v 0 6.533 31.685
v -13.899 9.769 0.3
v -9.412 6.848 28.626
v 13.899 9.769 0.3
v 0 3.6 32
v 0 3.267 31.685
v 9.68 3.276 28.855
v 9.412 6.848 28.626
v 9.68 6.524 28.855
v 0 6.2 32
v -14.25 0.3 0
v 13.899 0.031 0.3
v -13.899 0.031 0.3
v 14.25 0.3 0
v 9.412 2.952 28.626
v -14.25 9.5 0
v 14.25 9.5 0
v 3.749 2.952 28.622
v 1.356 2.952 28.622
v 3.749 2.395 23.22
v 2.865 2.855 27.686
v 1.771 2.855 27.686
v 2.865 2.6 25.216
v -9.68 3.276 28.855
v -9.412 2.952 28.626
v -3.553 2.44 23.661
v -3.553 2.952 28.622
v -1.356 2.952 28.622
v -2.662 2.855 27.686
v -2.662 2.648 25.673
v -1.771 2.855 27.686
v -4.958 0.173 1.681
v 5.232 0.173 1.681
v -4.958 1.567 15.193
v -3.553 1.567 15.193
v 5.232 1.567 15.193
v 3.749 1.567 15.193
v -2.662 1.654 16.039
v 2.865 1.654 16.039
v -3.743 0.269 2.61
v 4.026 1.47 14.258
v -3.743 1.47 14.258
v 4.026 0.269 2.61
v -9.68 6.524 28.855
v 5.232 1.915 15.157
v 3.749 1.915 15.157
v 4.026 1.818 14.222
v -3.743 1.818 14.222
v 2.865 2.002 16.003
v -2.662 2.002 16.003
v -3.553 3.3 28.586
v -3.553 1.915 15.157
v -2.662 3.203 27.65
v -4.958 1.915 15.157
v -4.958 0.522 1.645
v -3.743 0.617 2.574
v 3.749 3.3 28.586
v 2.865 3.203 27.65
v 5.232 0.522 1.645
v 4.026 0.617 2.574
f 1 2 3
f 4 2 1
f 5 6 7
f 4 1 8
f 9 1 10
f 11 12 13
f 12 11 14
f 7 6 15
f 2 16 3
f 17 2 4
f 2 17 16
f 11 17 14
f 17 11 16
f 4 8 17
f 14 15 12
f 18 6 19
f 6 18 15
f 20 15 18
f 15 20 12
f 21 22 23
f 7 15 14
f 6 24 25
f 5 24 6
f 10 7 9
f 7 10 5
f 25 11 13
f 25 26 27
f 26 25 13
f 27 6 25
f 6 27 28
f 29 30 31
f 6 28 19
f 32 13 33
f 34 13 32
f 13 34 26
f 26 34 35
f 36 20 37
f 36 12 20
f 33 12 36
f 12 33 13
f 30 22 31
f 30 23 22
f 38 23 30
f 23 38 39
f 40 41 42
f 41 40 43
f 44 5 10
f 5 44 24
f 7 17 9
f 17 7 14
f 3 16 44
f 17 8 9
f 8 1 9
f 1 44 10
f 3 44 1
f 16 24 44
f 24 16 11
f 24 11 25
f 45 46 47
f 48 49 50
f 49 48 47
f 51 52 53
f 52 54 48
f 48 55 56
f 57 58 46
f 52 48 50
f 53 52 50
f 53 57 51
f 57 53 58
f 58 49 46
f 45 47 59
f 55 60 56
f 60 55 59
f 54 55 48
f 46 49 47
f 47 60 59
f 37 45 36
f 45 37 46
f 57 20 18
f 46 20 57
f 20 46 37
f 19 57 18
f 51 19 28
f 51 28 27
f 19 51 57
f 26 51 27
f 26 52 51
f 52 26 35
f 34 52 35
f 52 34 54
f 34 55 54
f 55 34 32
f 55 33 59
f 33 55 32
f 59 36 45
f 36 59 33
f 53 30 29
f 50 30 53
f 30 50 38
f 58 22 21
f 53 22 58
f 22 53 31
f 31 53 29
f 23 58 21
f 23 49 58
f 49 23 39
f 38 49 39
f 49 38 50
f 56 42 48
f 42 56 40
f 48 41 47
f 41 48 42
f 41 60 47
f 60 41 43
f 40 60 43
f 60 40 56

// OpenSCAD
// file: ../lib/filaments.scad
// SPDX-License-Identifier: MIT
// Copyright (c) 2026 KomaSCAD contributors. https://github.com/Kazutadashi/koma-scad
//
// The named filaments of every module. Include this file:
//     include <../lib/filaments.scad>
// A Customizer list of filaments must name these entries, and can add Custom.

// [name, [red, green, blue, opacity]], each channel from 0 to 1.
filament_palette = [
    ["Wood", [0.76, 0.58, 0.34, 1]],   ["Black", [0.08, 0.06, 0.04, 1]],
    ["White", [0.95, 0.95, 0.95, 1]],  ["Red", [0.65, 0.05, 0.04, 1]],
    ["Blue", [0.08, 0.25, 0.8, 1]],    ["Green", [0.08, 0.5, 0.2, 1]],
    ["Purple", [0.45, 0.15, 0.65, 1]], ["Yellow", [0.95, 0.8, 0.08, 1]],
    ["Orange", [0.95, 0.35, 0.05, 1]], ["Silver", [0.7, 0.72, 0.75, 1]],
    ["Gold", [0.8, 0.62, 0.2, 1]],     ["Glitter silver", [0.7, 0.72, 0.75, 1]],
    ["Glitter gold", [0.8, 0.62, 0.2, 1]],
    ["Filament 1", [0.5, 0.5, 0.5, 1]], ["Filament 2", [0.15, 0.5, 0.85, 1]], ["Filament 3", [0.85, 0.25, 0.5, 1]],
    // The colors of the traditional woods: kaya (榧) for boards and komadai, island
    // mulberry (桑) and black persimmon (黒柿) for boxes. Colors only: no grain.
    ["Kaya", [0.86, 0.72, 0.47, 1]],   ["Kuwa", [0.66, 0.45, 0.23, 1]],
    ["Kurogaki", [0.23, 0.18, 0.14, 1]]
];

// The color of a named filament. Custom gives custom_rgba.
function filament_rgba(name, custom_rgba) =
    let(found = [for (entry = filament_palette) if (entry[0] == name) entry[1]])
    name == "Custom" ? custom_rgba
    : assert(len(found) == 1, str("Unknown filament: ", name)) found[0];
// main file
// SPDX-License-Identifier: MIT
// Copyright (c) 2026 KomaSCAD contributors. https://github.com/Kazutadashi/koma-scad
//
// KomaSCAD: a parametric shogi piece. Tested with OpenSCAD 2021.01.
// The default settings make the king of the bundled shogi set.
// Units are mm and degrees, before Model Scale, unless a comment says otherwise.
// Guides: README.md. Every setting: docs/parameters.md.
// Keep koma.json and move_diagrams.scad next to this file, and ../lib/ next to its folder.

/* [01 - Start here] */
// A label for your own use. It does not change the piece.
Category = "King";
// Characters on the front, from the point to the heel.
Front_Characters = "王将";
// Characters on the back (the promoted side). Empty = blank back.
Back_Characters = "";
// An installed Japanese font. Find its exact name in Help > Font List.
Font_Name = "Yuji Syuku:style=Regular";
// Model shows the piece in its colors; press F6 for an STL. Use komascad.py export for a color 3MF.
Output_Mode = "Model"; // [Model,Blank,Inspect front,Inspect back,Inspect printability,Inspect signature,Inspect pawn circle]
// How the piece sits on the print bed. Raised text cannot touch the bed.
Print_Orientation = "Upright"; // [Upright,Front face down,Back face down]
// Multiplier for all lengths. 1 = the dimensions below.
Model_Scale = 1; // [0.25:0.05:20]

/* [02 - Piece dimensions] */
// mm. Length from the heel to the point.
Piece_Length = 32; // [15:0.1:100]
// mm. Width at the heel.
Base_Width = 28.5; // [10:0.1:100]
// mm. Thickness at the heel.
Rear_Thickness = 9.8; // [3:0.1:30]
// Tip thickness: set the thickness at the point. Reference side angles: set the slope of each face.
Taper_Mode = "Tip thickness"; // [Tip thickness,Reference side angles]
// mm. Thickness at the point, before the bevel.
Tip_Thickness = 3.2; // [1:0.1:20]

/* [03 - Front layout] */
// mm. Text size, not the measured glyph height. 0 = automatic.
Front_Font_Size = 10.4; // [0:0.1:40]
// Multiplier for the text size. 1.1 = 10% larger.
Front_Text_Scale = 1; // [0.25:0.01:2]
// mm. Distance between character centers. 0 = automatic.
Front_Character_Spacing = 10.5; // [0:0.1:40]
// Multiplier for the automatic spacing. It does not change the text size.
Front_Spacing_Scale = 1; // [0.5:0.01:2]
// Center of the text: 0 = heel, 1 = point. With Move Pitch above 0, the center of the characters only.
Front_Center_Fraction = 0.455; // [0:0.01:1]
// mm. Moves all the text. Positive = to the right.
Front_Text_X = 0; // [-20:0.1:20]
// mm. Moves all the text. Positive = toward the point.
Front_Text_Y = 0; // [-20:0.1:20]
// Multiplier for the glyph width. It does not change the spacing.
Front_Width_Scale = 1; // [0.25:0.01:2]
// Multiplier for the glyph height.
Front_Height_Scale = 1.06; // [0.25:0.01:2]
// Degrees, counterclockwise. Turns all the text around its center.
Front_Text_Rotation = 0; // [-180:1:180]

/* [04 - Back layout] */
// Use the front layout, text style, depth and stroke on the back. Back text and color stay separate.
Mirror_Front_Settings = false;
// mm. Text size, not the measured glyph height. 0 = automatic.
Back_Font_Size = 0; // [0:0.1:40]
// Multiplier for the text size. 1.1 = 10% larger.
Back_Text_Scale = 1; // [0.25:0.01:2]
// mm. Distance between character centers. 0 = automatic.
Back_Character_Spacing = 0; // [0:0.1:40]
// Multiplier for the automatic spacing. It does not change the text size.
Back_Spacing_Scale = 1; // [0.5:0.01:2]
// Center of the text: 0 = heel, 1 = point. With Move Pitch above 0, the center of the characters only.
Back_Center_Fraction = 0.42; // [0:0.01:1]
// mm. Moves all the text. Positive = to the right, seen from the back.
Back_Text_X = 0; // [-20:0.1:20]
// mm. Moves all the text. Positive = toward the point.
Back_Text_Y = 0; // [-20:0.1:20]
// Multiplier for the glyph width. It does not change the spacing.
Back_Width_Scale = 1; // [0.25:0.01:2]
// Multiplier for the glyph height.
Back_Height_Scale = 1; // [0.25:0.01:2]
// Degrees, counterclockwise. Turns all the text around its center.
Back_Text_Rotation = 0; // [-180:1:180]

/* [05 - Front character adjustments] */
// Multiplier for each character: [first, second, third], from the point. A diagram uses the entry of its slot.
Front_Glyph_Size = [1, 1, 1]; // [0.25:0.01:2]
// Multiplier for the width of each character.
Front_Glyph_Width = [1, 1.4, 1]; // [0.25:0.01:2]
// Multiplier for the height of each character.
Front_Glyph_Height = [1, 1, 1]; // [0.25:0.01:2]
// mm. Moves each character. Positive = to the right.
Front_Glyph_X = [0, 0, 0]; // [-10:0.1:10]
// mm. Moves each character. Positive = toward the point.
Front_Glyph_Y = [2, -1, 0]; // [-10:0.1:10]
// Degrees, counterclockwise. Turns each character.
Front_Glyph_Rotation = [0, 0, 0]; // [-180:1:180]

/* [06 - Back character adjustments] */
// Multiplier for each character: [first, second, third], from the point. A diagram uses the entry of its slot.
Back_Glyph_Size = [1, 1, 1]; // [0.25:0.01:2]
// Multiplier for the width of each character.
Back_Glyph_Width = [1, 1, 1]; // [0.25:0.01:2]
// Multiplier for the height of each character.
Back_Glyph_Height = [1, 1, 1]; // [0.25:0.01:2]
// mm. Moves each character. Positive = to the right, seen from the back.
Back_Glyph_X = [0, 0, 0]; // [-10:0.1:10]
// mm. Moves each character. Positive = toward the point.
Back_Glyph_Y = [1, 0, 0]; // [-10:0.1:10]
// Degrees, counterclockwise. Turns each character.
Back_Glyph_Rotation = [0, 0, 0]; // [-180:1:180]

/* [07 - Filament colors] */
// Body color. It becomes a named material in the color 3MF. Custom uses Body Color.
Body_Filament = "Wood"; // [Wood,Black,White,Red,Blue,Green,Purple,Yellow,Orange,Silver,Gold,Glitter silver,Glitter gold,Filament 1,Filament 2,Filament 3,Custom]
// Front text color.
Front_Filament = "Black"; // [Same as body,Wood,Black,White,Red,Blue,Green,Purple,Yellow,Orange,Silver,Gold,Glitter silver,Glitter gold,Filament 1,Filament 2,Filament 3,Custom]
// Back text color.
Back_Filament = "Red"; // [Same as body,Same as front,Wood,Black,White,Red,Blue,Green,Purple,Yellow,Orange,Silver,Gold,Glitter silver,Glitter gold,Filament 1,Filament 2,Filament 3,Custom]

/* [08 - Engraving and stroke weight] */
// Face only: color the groove floor. Painted grooves: floor and walls. Flush filled: fill the groove.
Text_Color_Treatment = "Flush filled"; // [Face only,Painted grooves,Flush filled]
// Recessed: cut into the face. Raised: stands up from the face. None: no text.
Front_Text_Style = "Recessed"; // [Recessed,Raised,None]
// Recessed: cut into the face. Raised: stands up from the face. None: no text.
Back_Text_Style = "Recessed"; // [Recessed,Raised,None]
// mm. Depth of recessed text, or height of raised text.
Front_Relief_Depth = 0.35; // [0:0.05:3]
// mm. Depth of recessed text, or height of raised text.
Back_Relief_Depth = 0.35; // [0:0.05:3]
// mm. Makes each stroke wider (positive) or thinner (negative). Wide strokes can close small gaps.
Front_Stroke_Expansion = 0.04; // [-0.2:0.01:0.5]
// mm. Makes each stroke wider (positive) or thinner (negative). Wide strokes can close small gaps.
Back_Stroke_Expansion = 0.04; // [-0.2:0.01:0.5]
// A different font for the front. Empty = Font Name.
Front_Font_Override = "";
// A different font for the back. Empty = Font Name.
Back_Font_Override = "";
// mm. Rounds the text edges. 0 = sharp. Rounding can remove thin strokes.
Text_Edge_Radius = 0; // [0:0.01:0.5]
// Number of layers that make a rounded text edge.
Text_Rounding_Steps = 6; // [2:1:12]

/* [09 - Edges and face margin] */
// mm. Width of the edge bevel, seen from above. 0 = no bevel.
Bevel_Width = 0.3; // [0:0.05:3]
// mm. Depth of the edge bevel. 0 = no bevel.
Bevel_Depth = 0.3; // [0:0.02:2]
// mm. Smallest distance from the text to the edge of the flat face.
Text_Margin = 0.9; // [0:0.1:4]
// Cut off text that goes past the margin. Inspect front and Inspect back show it in red.
Protect_Face_Edges = true;
// mm, after Model Scale. Smallest solid thickness at the point, between the front and back recesses.
Minimum_Web = 1.2; // [0.2:0.1:5]

/* [10 - Advanced shape angles] */
// Make the outline fit 20 pieces into a ring (base angle 81 degrees). Check it with Inspect pawn circle.
Pawn_Circle = true;
// The angle to calculate from the other two: 2 x base + 2 x shoulder + tip = 540 degrees.
Angle_Mode = "Derive shoulder"; // [Derive shoulder,Derive tip,Derive base,Check all three]
// Degrees. Outline angle at the two heel corners.
Face_Base_Angle = 81;
// Degrees. Outline angle at the two shoulders.
Face_Shoulder_Angle = 117;
// Degrees. Outline angle at the point.
Face_Tip_Angle = 144;
// Degrees. Slope of the front face at the heel. Only for Reference side angles.
Front_Side_Base_Angle = 85;
// Degrees. Slope of the back face at the heel. Only for Reference side angles.
Back_Side_Base_Angle = 81;

/* [11 - Inspection and quality] */
// [red, green, blue, opacity], 0 to 1. Used when Body Filament is Custom.
Body_Color = [0.82, 0.68, 0.43, 1];
// [red, green, blue, opacity], 0 to 1. Used when Front Filament is Custom.
Front_Inscription_Color = [0.025, 0.02, 0.015, 1];
// [red, green, blue, opacity], 0 to 1. Used when Back Filament is Custom.
Back_Inscription_Color = [0.65, 0.05, 0.04, 1];
// Show the safe area and the center line in the Inspect views.
Show_Layout_Guides = true;
// Number of segments in a curve. More is smoother and slower.
Text_Curve_Resolution = 64; // [16:8:128]
// mm, after Model Scale. The line width of your printer on the face. Inspect printability and komascad.py check use it.
Print_Line_Width = 0.5; // [0.2:0.05:1.2]

/* [12 - Maker signature on heel] */
// Put a mark on the heel (the wide bottom edge).
Signature_Enabled = false;
// The mark. It reads left to right when you look at the heel with the front face up.
Signature_Text = "";
// Font of the mark. Empty = Font Name.
Signature_Font = "";
// mm. Text size of the mark.
Signature_Font_Size = 5; // [0.5:0.1:8]
// Multiplier for the letter spacing.
Signature_Letter_Spacing = 1; // [0.5:0.05:2]
// mm. Moves the mark. Positive = to the right.
Signature_X = 0; // [-12:0.1:12]
// mm. Moves the mark. Positive = toward the front face.
Signature_Y = 0; // [-5:0.1:5]
// Degrees, counterclockwise. Turns the mark.
Signature_Rotation = 0; // [-180:1:180]
// mm. Depth of the mark into the heel.
Signature_Depth = 0.2; // [0:0.05:2]
// mm. Smallest distance from the mark to the heel edges.
Signature_Margin = 0.6; // [0.1:0.1:3]
// Color of the mark.
Signature_Filament = "Same as front"; // [Same as body,Same as front,Wood,Black,White,Red,Blue,Green,Purple,Yellow,Orange,Silver,Gold,Glitter silver,Glitter gold,Filament 1,Filament 2,Filament 3,Custom]
// [red, green, blue, opacity], 0 to 1. Used when Signature Filament is Custom.
Signature_Color = [0.025, 0.02, 0.015, 1];

/* [13 - Movement diagrams] */
// Movement grid, rows from point to heel, / between rows. See docs/move-diagrams.md. Empty = none.
Front_Moves = "";
// Put the diagram below or above the characters.
Front_Move_Position = "Below"; // [Below,Above]
// Movement grid for the back, after promotion. Empty = no diagram.
Back_Moves = "";
// Put the diagram below or above the characters.
Back_Move_Position = "Below"; // [Below,Above]
// mm, after Model Scale. Thinnest diagram line.
Move_Stroke = 0.6; // [0.3:0.05:2]
// mm, after Model Scale. Smallest space between diagram marks.
Move_Gap = 0.6; // [0.3:0.05:2]
// mm, after Model Scale. Distance between squares. 0 = automatic. Use one value for all pieces of a set.
Move_Pitch = 0; // [0:0.05:10]

/* [Hidden] */
// komascad.py sets this to read the materials and fonts without making geometry.
Export_Metadata = false;

// General helpers.
function in_list(x, list) = len([for (y = list) if (x == y) 1]) > 0;
function sum(v, n) = n <= 0 ? 0 : v[n-1] + sum(v, n-1);
function unit(v) = v/norm(v);
function inward(v) = [-v[1], v[0]];

version = "3.5";   // the same as VERSION in komascad_lib/project.py; a test checks this
$fn = Text_Curve_Resolution;
epsilon = 0.02;   // overlap that keeps boolean operations clean


// ===== 1. Face settings ======================================================
// f is true for the front and false for the back.

function chars(f) = f ? Front_Characters : Back_Characters;
function move_grid(f) = f ? Front_Moves : Back_Moves;
function has_moves(f) = len(move_grid(f)) > 0;
function moves_above(f) = has_moves(f) && (f ? Front_Move_Position : Back_Move_Position) == "Above";

// Settings that the back takes from the front when Mirror Front Settings is on.
function pick(f, front, back) = f || Mirror_Front_Settings ? front : back;
function style(f)             = pick(f, Front_Text_Style, Back_Text_Style);
function depth(f)             = pick(f, Front_Relief_Depth, Back_Relief_Depth);
function stroke_expansion(f)  = pick(f, Front_Stroke_Expansion, Back_Stroke_Expansion);
function font_override(f)     = pick(f, Front_Font_Override, Back_Font_Override);
function font(f)              = font_override(f) == "" ? Font_Name : font_override(f);
function font_size_setting(f) = pick(f, Front_Font_Size, Back_Font_Size);
function text_scale(f)        = pick(f, Front_Text_Scale, Back_Text_Scale);
function spacing_setting(f)   = pick(f, Front_Character_Spacing, Back_Character_Spacing);
function spacing_scale(f)     = pick(f, Front_Spacing_Scale, Back_Spacing_Scale);
function center_fraction(f)   = pick(f, Front_Center_Fraction, Back_Center_Fraction);
function text_x(f)            = pick(f, Front_Text_X, Back_Text_X);
function text_y(f)            = pick(f, Front_Text_Y, Back_Text_Y);
function text_rotation(f)     = pick(f, Front_Text_Rotation, Back_Text_Rotation);

// Per-character lists. Entries after the third are neutral.
function entry(list, i, neutral) = i < len(list) ? list[i] : neutral;
function glyph_size(f, i)     = entry(pick(f, Front_Glyph_Size, Back_Glyph_Size), i, 1);
function glyph_width(f, i)    = entry(pick(f, Front_Glyph_Width, Back_Glyph_Width), i, 1)
                                * pick(f, Front_Width_Scale, Back_Width_Scale);
function glyph_height(f, i)   = entry(pick(f, Front_Glyph_Height, Back_Glyph_Height), i, 1)
                                * pick(f, Front_Height_Scale, Back_Height_Scale);
function glyph_x(f, i)        = entry(pick(f, Front_Glyph_X, Back_Glyph_X), i, 0);
function glyph_y(f, i)        = entry(pick(f, Front_Glyph_Y, Back_Glyph_Y), i, 0);
function glyph_rotation(f, i) = entry(pick(f, Front_Glyph_Rotation, Back_Glyph_Rotation), i, 0);

// A face holds its characters, plus one slot for the diagram above or below them.
function slots(f) = len(chars(f)) + (has_moves(f) ? 1 : 0);
function diagram_slot(f) = !has_moves(f) ? -1 : moves_above(f) ? 0 : slots(f) - 1;
function active(f) = slots(f) > 0 && style(f) != "None" && depth(f) > 0;
function recessed(f) = active(f) && style(f) == "Recessed";

// Each printed part has a role. The color 3MF has one part for each role.
body_role = 0;
front_role = 1;
back_role = 2;
signature_role = 3;
function face_role(f) = f ? front_role : back_role;

// The named filaments, which the other modules share.
include <../lib/filaments.scad>
role_names = ["body", "front", "back", "signature"];
function filament(role) = [Body_Filament, Front_Filament, Back_Filament, Signature_Filament][role];
// The role whose filament this role uses: "Same as body" and "Same as front" point to another role.
function material_source(role) =
      filament(role) == "Same as body" ? body_role
    : filament(role) == "Same as front" ? material_source(front_role)
    : role;
function material_name(role) =
    let(src = material_source(role))
    filament(src) == "Custom" ? str("Custom ", role_names[src]) : filament(src);
function material_rgb(role) =
    let(src = material_source(role))
    filament_rgba(filament(src), [Body_Color, Front_Inscription_Color, Back_Inscription_Color, Signature_Color][src]);


// ===== 2. Piece body ==========================================================
// Plan view: x across the piece, y from the heel (y = 0) to the point.
// z is the thickness: the back face is near z = 0, the front face on top.

// The outline angles. Angle Mode selects the one that follows from the other two.
base_angle = Angle_Mode == "Derive base"
    ? (Pawn_Circle ? 81 : (540 - 2*Face_Shoulder_Angle - Face_Tip_Angle)/2)
    : Face_Base_Angle;
shoulder_angle = Angle_Mode == "Derive shoulder" ? (540 - 2*Face_Base_Angle - Face_Tip_Angle)/2 : Face_Shoulder_Angle;
tip_angle = Angle_Mode == "Derive tip" ? 540 - 2*Face_Base_Angle - 2*Face_Shoulder_Angle : Face_Tip_Angle;

// Each face drops this far in z for each mm toward the point.
front_slope = Taper_Mode == "Tip thickness"
    ? (Rear_Thickness - Tip_Thickness)/(2*Piece_Length)
    : 1/tan(Front_Side_Base_Angle);
back_slope = Taper_Mode == "Tip thickness" ? front_slope : 1/tan(Back_Side_Base_Angle);
tip_thickness = Rear_Thickness - Piece_Length*(front_slope + back_slope);

shoulder_y = (Piece_Length - Base_Width/2*tan((180 - tip_angle)/2))
             / (1 - tan(90 - base_angle)*tan((180 - tip_angle)/2));
shoulder_x = Base_Width/2 - shoulder_y*tan(90 - base_angle);
outline = [[-Base_Width/2, 0], [Base_Width/2, 0], [shoulder_x, shoulder_y],
           [0, Piece_Length], [-shoulder_x, shoulder_y]];

// Corner i of the outline, moved inward by distance from both of its edges.
function inset_point(i, distance) =
    let(p = outline[i], before = inward(unit(p - outline[(i+4)%5])), after = inward(unit(outline[(i+1)%5] - p)))
    p + distance*(before + after)/(1 + before*after);

has_bevel = Bevel_Width > 0 && Bevel_Depth > 0;
bevel_outline = [for (i = [0:4]) inset_point(i, Bevel_Width)];
flat_outline = has_bevel ? bevel_outline : outline;   // the flat face, inside the bevel
safe_inset = (has_bevel ? Bevel_Width : 0) + Text_Margin;
safe_outline = [for (i = [0:4]) inset_point(i, safe_inset)];   // the text stays inside this

function back_face_z(p) = p[1]*back_slope;
function front_face_z(p) = Rear_Thickness - p[1]*front_slope;

// The body is a stack of 5-point rings from the back face to the front face.
// Every point of a face comes from one plane equation, so each face stays flat.
body_rings = has_bevel
    ? [[for (p = bevel_outline) [p[0], p[1], back_face_z(p)]],
       [for (p = outline) [p[0], p[1], back_face_z(p) + Bevel_Depth]],
       [for (p = outline) [p[0], p[1], front_face_z(p) - Bevel_Depth]],
       [for (p = bevel_outline) [p[0], p[1], front_face_z(p)]]]
    : [[for (p = outline) [p[0], p[1], back_face_z(p)]],
       [for (p = outline) [p[0], p[1], front_face_z(p)]]];
body_points = [for (ring = body_rings, p = ring) p];
last_ring = len(body_rings) - 1;
// The faces: the back face, then the sides ring by ring, then the front face.
body_faces = concat(
    [[4, 3, 2, 1, 0]],
    [for (r = [0:last_ring-1], i = [0:4]) [5*r + i, 5*r + (i+1)%5, 5*(r+1) + (i+1)%5, 5*(r+1) + i]],
    [[for (i = [0:4]) 5*last_ring + i]]);
back_face_index = 0;
front_face_index = len(body_faces) - 1;
heel_face_index = 1 + (has_bevel ? 5 : 0);   // the side between corners 0 and 1

// Triangulate in a fixed way, so that CGAL output is the same every time.
function triangles(face) = [for (k = [1:len(face)-2]) [face[0], face[k], face[k+1]]];
module body_shell(omit=[]) {
    polyhedron(points=body_points, convexity=10,
        faces=[for (i = [0:len(body_faces)-1], t = triangles(body_faces[i]))
                   if (!in_list(i, omit)) [t[2], t[1], t[0]]]);
}
module blank() { body_shell(); }


// ===== 3. Text layout =========================================================
// Text is drawn flat in face coordinates: x across, y along the face from the
// heel, z out of the face. on_face() puts it on the sloped face.

// Automatic text size: the characters fill auto_fill of the face length, at
// auto_slot_sizes text sizes per slot, and are never wider than max_width_share
// of the heel. Each character slot is spacing_sizes text sizes long.
auto_fill = 0.72;
auto_slot_sizes = 1.35;
max_width_share = 0.43;
spacing_sizes = 1.42;
// With a diagram, the characters and the diagram fill this share of the safe face length.
move_fill = 0.9;
// Without Move Pitch, a diagram grows up to this many text sizes.
diagram_growth = 1.2;

function slope(f) = f ? front_slope : back_slope;
function cosine(f) = 1/sqrt(1 + slope(f)*slope(f));
function face_length(f) = Piece_Length/cosine(f);
function face_polygon(points, f) = [for (p = points) [p[0], p[1]/cosine(f)]];
function safe_ys(f) = [for (p = safe_outline) p[1]/cosine(f)];
function safe_length(f) = max(safe_ys(f)) - min(safe_ys(f));

// With a diagram, the characters get the face length that the smallest
// printable diagram leaves. The diagram slot adds half a character gap, (spacing - 1)/2 sizes.
function auto_font_size(f) =
    let(n = len(chars(f)), spacing = spacing_sizes*spacing_scale(f))
    has_moves(f) && n > 0
    ? (safe_length(f)*move_fill - min_diagram_size(f)[1]) / (spacing*n + (spacing - 1)/2)
    : face_length(f)*auto_fill/(auto_slot_sizes*max(1, slots(f)));
function font_size(f) =
    text_scale(f) * (font_size_setting(f) > 0 ? font_size_setting(f)
                     : min(Base_Width*max_width_share, auto_font_size(f)));
function char_spacing(f) =
    spacing_setting(f) > 0 ? spacing_setting(f) : font_size(f)*spacing_sizes*spacing_scale(f);

// Slots stack from the point to the heel. A character slot is one character
// spacing long, with half a character gap on each side of the character. A
// diagram slot is the diagram plus half a gap on the characters' side only, so
// the diagram is one gap from the characters and nothing is wasted at the edge.
function diagram_pad(f) = len(chars(f)) > 0 ? (char_spacing(f) - font_size(f))/2 : 0;
function slot_height(f, i) =
    i == diagram_slot(f) ? diagram_size(f)[1] + diagram_pad(f) : char_spacing(f);
function slot_heights(f) = [for (i = [0:slots(f)-1]) slot_height(f, i)];
function stack_height(f) = sum(slot_heights(f), slots(f));
// The center of slot i, from the center of the stack.
function slot_y(f, i) = stack_height(f)/2 - sum(slot_heights(f), i) - slot_heights(f)[i]/2;
// The center of the diagram: the end of its slot away from the characters.
function diagram_y(f) = slot_y(f, diagram_slot(f)) + (moves_above(f) ? 1 : -1)*diagram_pad(f)/2;

// The center of the stack on the face.
function center_y(f) =
    let(c = face_length(f)*center_fraction(f) + text_y(f), n = len(chars(f)))
    !has_moves(f) ? c
    // With a fixed Move Pitch (a set), Center Fraction places the characters, and
    // the diagram goes beside them. The characters then line up on every piece.
    : Move_Pitch > 0 && n > 0 ? c - sum([for (i = [0:slots(f)-1]) if (i != diagram_slot(f)) slot_y(f, i)], n)/n
    // Otherwise keep the stack inside the face. The fit check stops a stack that is too long.
    : let(half = stack_height(f)/2) max(min(safe_ys(f)) + half, min(max(safe_ys(f)) - half, c));

// Face coordinates to model coordinates. The back is turned over, so that its text reads correctly.
module on_face(f) {
    s = f ? 1 : -1;
    c = cosine(f);
    multmatrix([[s, 0, 0, 0],
                [0, c, slope(f)*c, 0],
                [0, -s*slope(f)*c, s*c, f ? Rear_Thickness : 0],
                [0, 0, 0, 1]]) children();
}
module safe_face(f) { polygon(face_polygon(safe_outline, f)); }
module flat_face(f) { polygon(face_polygon(flat_outline, f)); }

// The characters and the diagram, before Protect Face Edges.
module raw_inscription(f, diagram=true) {
    if (slots(f) > 0 && style(f) != "None")
    translate([text_x(f), center_y(f)]) rotate(text_rotation(f))
    for (i = [0:slots(f)-1])
        translate([glyph_x(f, i), (i == diagram_slot(f) ? diagram_y(f) : slot_y(f, i)) + glyph_y(f, i)])
        rotate(glyph_rotation(f, i))
        if (i == diagram_slot(f)) { if (diagram) move_diagram(f); }
        // Stroke expansion is for lettering only. Expand after scaling, so that it stays a true mm value.
        else offset(delta=stroke_expansion(f)) scale(glyph_size(f, i)*[glyph_width(f, i), glyph_height(f, i)])
            text(chars(f)[moves_above(f) ? i-1 : i], size=font_size(f), font=font(f),
                 halign="center", valign="center", language="ja");
}
module inscription(f) {
    if (Protect_Face_Edges) intersection() { raw_inscription(f); safe_face(f); }
    else raw_inscription(f);
}


// ===== 4. Movement diagrams ===================================================
// move_diagrams.scad reads the grids and lays out the marks. This section sizes
// the diagram of each face.

mv_w = Move_Stroke/Model_Scale;   // the thinnest line
mv_g = Move_Gap/Model_Scale;      // the smallest space between marks
mv_min_head = 2.4/Model_Scale;    // a slicer turns a shorter arrowhead into a dot
include <move_diagrams.scad>

// OpenSCAD does not cache function results, and the solver is slow. Thus each
// face's diagram is solved once here, and the functions below read the result.
front_moves = has_moves(true) ? mv_grid_moves("Front_Moves", Front_Moves) : [];
back_moves = has_moves(false) ? mv_grid_moves("Back_Moves", Back_Moves) : [];
// The smallest printable diagram. It sets how much the automatic text size shrinks.
front_min_pitch = has_moves(true) ? mv_solve(front_moves, mv_w) : 0;
back_min_pitch = has_moves(false) ? mv_solve(back_moves, mv_w) : 0;
front_min_size = has_moves(true) ? mv_size(mv_box(front_moves, front_min_pitch)) : [0, 0];
back_min_size = has_moves(false) ? mv_size(mv_box(back_moves, back_min_pitch)) : [0, 0];
function moves(f) = f ? front_moves : back_moves;
function min_pitch(f) = f ? front_min_pitch : back_min_pitch;
function min_diagram_size(f) = f ? front_min_size : back_min_size;

// The drawn pitch. A larger pitch only makes the gaps wider, so it stays
// printable. Without Move Pitch, the diagram grows to about one character, but
// only into face length that the characters leave free. A Glyph Size above 1
// for the diagram slot makes it larger.
function drawn_pitch(f) =
    Move_Pitch > 0 ? Move_Pitch/Model_Scale :
    let(size = min_diagram_size(f),
        letters = len(chars(f))*char_spacing(f) + diagram_pad(f),
        room = (safe_length(f)*move_fill - letters)/size[1])
    min_pitch(f) * max(1, min(diagram_growth*font_size(f)/max(size), room)) * max(1, glyph_size(f, diagram_slot(f)));
front_pitch = has_moves(true) ? drawn_pitch(true) : 0;
back_pitch = has_moves(false) ? drawn_pitch(false) : 0;
front_box = has_moves(true) ? mv_box(front_moves, front_pitch) : [[0, 0], [0, 0]];
back_box = has_moves(false) ? mv_box(back_moves, back_pitch) : [[0, 0], [0, 0]];
function pitch(f) = f ? front_pitch : back_pitch;
function diagram_box(f) = f ? front_box : back_box;
function diagram_size(f) = mv_size(diagram_box(f));

module move_diagram(f) { mv_draw(moves(f), pitch(f), diagram_box(f)); }


// ===== 5. The printed piece ===================================================

// A rounded text edge is built from thin layers; this is the outline of one layer.
module rounded_outline(f, r, expansion) {
    if (expansion > 0) offset(r=expansion) offset(delta=-r) inscription(f);
    else offset(delta=-r) inscription(f);
}
function text_radius(f) = min(Text_Edge_Radius, depth(f)/2);

// The text as a 3D cutter (Recessed) or solid (Raised), on its face.
module relief(f) {
    d = depth(f);
    raised = style(f) == "Raised";
    r = text_radius(f);
    zmin = raised ? -epsilon : -d;
    zmax = raised ? d : epsilon;
    if (active(f)) on_face(f) {
        if (r == 0) translate([0, 0, zmin]) linear_extrude(zmax - zmin, convexity=20) inscription(f);
        else {
            // A straight part, then thin layers that step in to make the rounded edge.
            translate([0, 0, raised ? zmin : zmin + r])
                linear_extrude(zmax - zmin - r, convexity=20) rounded_outline(f, r, r);
            h = r/Text_Rounding_Steps;
            overlap = min(epsilon, h/10);
            for (i = [0:Text_Rounding_Steps-1]) {
                t = (i + 0.5)/Text_Rounding_Steps;
                z = raised ? zmax - r + i*h : zmin + r - (i+1)*h;
                translate([0, 0, raised ? z - overlap : z])
                    linear_extrude(h + overlap, convexity=20) rounded_outline(f, r, r*sqrt(1 - t*t));
            }
        }
    }
}

// The maker's signature on the heel. Heel coordinates: x = model x, y = model z.
function signature_active() = Signature_Enabled && len(Signature_Text) > 0 && Signature_Depth > 0;
function signature_font() = Signature_Font == "" ? Font_Name : Signature_Font;
heel_rim = has_bevel ? Bevel_Depth : 0;
sig_half_width = Base_Width/2 - Signature_Depth*tan(90 - base_angle) - Signature_Margin;
sig_low = max(heel_rim, Signature_Depth*back_slope) + Signature_Margin - Rear_Thickness/2;
sig_high = min(Rear_Thickness - heel_rim, Rear_Thickness - Signature_Depth*front_slope)
           - Signature_Margin - Rear_Thickness/2;
module on_heel() { multmatrix([[1, 0, 0, 0], [0, 0, -1, 0], [0, 1, 0, Rear_Thickness/2], [0, 0, 0, 1]]) children(); }
module signature_safe() { translate([-sig_half_width, sig_low]) square([2*sig_half_width, sig_high - sig_low]); }
module signature_raw() {
    translate([Signature_X, Signature_Y]) rotate(Signature_Rotation)
    text(Signature_Text, size=Signature_Font_Size, font=signature_font(), spacing=Signature_Letter_Spacing,
         halign="center", valign="center");
}
module signature_outline() { intersection() { signature_raw(); signature_safe(); } }
module signature_cutter() {
    if (signature_active()) on_heel() translate([0, 0, -Signature_Depth])
        linear_extrude(Signature_Depth + epsilon, convexity=20) signature_outline();
}

// The exact piece in one material, for F6 and STL export.
module piece() {
    difference() {
        union() { blank(); for (f = [true, false]) if (style(f) == "Raised") relief(f); }
        for (f = [true, false]) if (style(f) == "Recessed") relief(f);
        signature_cutter();
    }
}


// ===== 6. Color parts for the 3MF exporter ====================================
// komascad.py renders each part with Output_Mode "Color body", "Color front",
// "Color back" or "Color signature", and puts them together in one 3MF.
// The parts touch, but do not overlap.
//
// A color part is a color volume behind the visible text surface, cut to the
// piece. The body is the piece minus all color volumes. Where two color
// volumes meet, the signature wins over the front, and the front over the back.

color_backing = 0.8;   // mm of color behind the visible surface; a 0.4 mm nozzle cannot print less
paint_wall = 0.35;     // Painted grooves: width of color beside the groove wall
paint_lip = 0.03;      // Painted grooves: body color at the top of the groove wall

color_roles = [front_role, back_role, signature_role];
function role_active(role) = role == signature_role ? signature_active() : active(role == front_role);
function role_depth(role) = role == signature_role ? Signature_Depth : depth(role == front_role);
function role_raised(role) = role != signature_role && style(role == front_role) == "Raised";
// The bottom of the color volume, and the visible text surface.
function color_floor(role) = role_raised(role) ? -color_backing : -role_depth(role) - color_backing;
function text_surface(role) = role_raised(role) ? role_depth(role) : -role_depth(role);
module role_outline(role) { if (role == signature_role) signature_outline(); else inscription(role == front_role); }
module on_role(role) { if (role == signature_role) on_heel() children(); else on_face(role == front_role) children(); }
// The outline of a role, extruded from z = bottom to z = top (z = 0 on the surface, negative inside).
module role_slab(role, bottom, top, grow=0) {
    on_role(role) translate([0, 0, bottom])
        linear_extrude(top - bottom, convexity=20) offset(delta=grow) role_outline(role);
}

// Face only can use its color volumes as they are, without the slow cut to the
// piece: with sharp text edges and wide margins, they lie fully inside the body.
face_only_fast = Text_Color_Treatment == "Face only" && Text_Edge_Radius == 0
    && Text_Margin > color_backing*max(front_slope, back_slope) + epsilon
    && (!signature_active()
        || Signature_Margin > color_backing*max(tan(90 - base_angle), front_slope, back_slope) + epsilon);

module color_volume(role) {
    treatment = Text_Color_Treatment;
    if (role_active(role)) {
        // A level inlay from the backing up through the face.
        if (treatment == "Flush filled") role_slab(role, -color_backing, epsilon);
        // Face only: the backing under the groove floor, or raised text and its backing.
        else if (treatment == "Face only") role_slab(role, color_floor(role), text_surface(role));
        // Painted grooves: also the groove walls, up to just under the face.
        else if (treatment == "Painted grooves" && !role_raised(role))
            role_slab(role, color_floor(role), -paint_lip, paint_wall);
        // Painted grooves, raised text: slightly larger than the text, so that the cut to the piece is clean.
        else role_slab(role, color_floor(role), text_surface(role) + epsilon, epsilon/2);
    }
}
// The solid that the color volumes are cut from. A flush inlay fills the groove.
module color_solid() { if (Text_Color_Treatment == "Flush filled") blank(); else piece(); }

module color_part(role) {
    difference() {
        if (face_only_fast) color_volume(role);
        else intersection() { color_solid(); color_volume(role); }
        if (role == back_role) color_volume(front_role);
        if (role != signature_role) color_volume(signature_role);
    }
}
module body_part() {
    // Fast: cut the groove and the color volume out of the plain body in one
    // step. Raised text belongs to its color part, so the body does not get it.
    if (face_only_fast) difference() {
        blank();
        for (role = color_roles) if (role_active(role)) role_slab(role, color_floor(role), epsilon);
    }
    else difference() { color_solid(); for (role = color_roles) color_volume(role); }
}


// ===== 7. Fast preview (F5) ===================================================
// On some graphics drivers, OpenSCAD 2021 shows an empty view after it
// subtracts text in F5. F5 Model therefore draws an open shell: the body
// without its text faces, each face as a thin skin with the text cut out in 2D,
// and the groove walls and floors at their true depth. F6 and the exporter use
// the exact geometry above.

module opening(f) { if (text_radius(f) == 0) inscription(f); else rounded_outline(f, text_radius(f), text_radius(f)); }
module floor_outline(f) { if (text_radius(f) == 0) inscription(f); else rounded_outline(f, text_radius(f), 0); }
// Groove walls: dark on a light body, light on a dark body, mixed with the body
// color. Light or dark is the perceived brightness (Rec. 601 weights).
function preview_wall_rgb() =
    let(body = material_rgb(body_role), mark = 0.299*body[0] + 0.587*body[1] + 0.114*body[2] > 0.45 ? 0.035 : 0.88)
    [for (i = [0:2]) (2*body[i] + mark)/3, 1];
// A thin outline of a 2D shape.
module rim(width) { difference() { offset(delta=width/2) children(); offset(delta=-width/2) children(); } }

module print_preview() {
    painted = Text_Color_Treatment == "Painted grooves";
    flush = Text_Color_Treatment == "Flush filled";
    color(material_rgb(body_role)) {
        body_shell(omit=concat(recessed(false) ? [back_face_index] : [],
                               recessed(true) ? [front_face_index] : [],
                               signature_active() ? [heel_face_index] : []));
        for (f = [true, false]) if (recessed(f))
            on_face(f) translate([0, 0, -epsilon/2]) linear_extrude(epsilon/2, convexity=20)
                difference() { flat_face(f); opening(f); }
        if (signature_active())
            on_heel() translate([0, 0, -epsilon/2]) linear_extrude(epsilon/2, convexity=20) difference() {
                translate([-Base_Width/2, -Rear_Thickness/2 + heel_rim])
                    square([Base_Width, Rear_Thickness - 2*heel_rim]);
                signature_outline();
            }
    }
    // The groove walls.
    if (!flush) {
        for (f = [true, false]) if (recessed(f))
            color(painted ? material_rgb(face_role(f)) : preview_wall_rgb())
            on_face(f) translate([0, 0, -depth(f)]) linear_extrude(depth(f), convexity=20) rim(epsilon) opening(f);
        if (signature_active())
            color(painted ? material_rgb(signature_role) : preview_wall_rgb())
            on_heel() translate([0, 0, -Signature_Depth]) linear_extrude(Signature_Depth, convexity=20)
                rim(epsilon) signature_outline();
    }
    // The colored surfaces.
    grow = painted ? paint_wall : 0;
    for (f = [true, false]) if (active(f)) color(material_rgb(face_role(f))) {
        if (style(f) == "Raised") relief(f);
        else if (flush) on_face(f) linear_extrude(epsilon/2, convexity=20) opening(f);
        else on_face(f) translate([0, 0, -depth(f)]) linear_extrude(epsilon/2, convexity=20)
            offset(delta=grow) floor_outline(f);
    }
    if (signature_active())
        color(material_rgb(signature_role)) on_heel() translate([0, 0, flush ? 0 : -Signature_Depth])
        linear_extrude(epsilon/2, convexity=20) offset(delta=grow) signature_outline();
}


// ===== 8. Inspection views (F5 only) ==========================================

guide_rgb = [0.1, 0.5, 0.9, 0.65];
module guide_line(width=0.08) { difference() { children(); offset(delta=-width) children(); } }
module preview_only() { assert($preview, "Inspect views are F5 only. Select Model or Blank to export an STL."); }

// One face, flat: the text in its color, overflow in red, the safe area in blue.
module inspect_face(f) {
    preview_only();
    color(material_rgb(body_role)) linear_extrude(0.1) polygon(face_polygon(outline, f));
    if (active(f)) {
        color(material_rgb(face_role(f))) translate([0, 0, 0.12]) linear_extrude(0.02)
            intersection() { raw_inscription(f); safe_face(f); }
        color([1, 0, 0, 1]) translate([0, 0, 0.15]) linear_extrude(0.02)
            difference() { raw_inscription(f); safe_face(f); }
    }
    if (Show_Layout_Guides) {
        color(guide_rgb) translate([0, 0, 0.11]) linear_extrude(0.005) guide_line() safe_face(f);
        color(guide_rgb) translate([-0.025, 0, 0.11]) cube([0.05, face_length(f), 0.005]);
        // One printed line at final size, beside the piece.
        color([0.1, 0.5, 0.9, 1]) translate([Base_Width/2 + 2, 2, 0])
            cube([Print_Line_Width/Model_Scale, 5/Model_Scale, 0.1]);
    }
}

module inspect_signature() {
    preview_only();
    color(material_rgb(body_role)) linear_extrude(0.1) square([Base_Width, Rear_Thickness], center=true);
    if (signature_active()) {
        color(material_rgb(signature_role)) translate([0, 0, 0.12]) linear_extrude(0.02) signature_outline();
        color([1, 0, 0, 1]) translate([0, 0, 0.15]) linear_extrude(0.02)
            difference() { signature_raw(); signature_safe(); }
    }
    if (Show_Layout_Guides)
        color(guide_rgb) translate([0, 0, 0.11]) linear_extrude(0.005) guide_line() signature_safe();
}

// Twenty outlines in a ring, in plan view, without text, taper or bevel.
pawn_circle_apothem = Base_Width/(2*tan(9));
module inspect_pawn_circle() {
    preview_only();
    assert(Pawn_Circle, "Turn on Pawn Circle first.");
    for (i = [0:19]) rotate(i*18) translate([0, -pawn_circle_apothem]) {
        color(i%2 == 0 ? material_rgb(body_role) : [0.64, 0.43, 0.22, 1]) linear_extrude(0.1) polygon(outline);
        if (Show_Layout_Guides)
            color([0.1, 0.5, 0.9, 1]) translate([0, 0, 0.11]) linear_extrude(0.005) guide_line() polygon(outline);
    }
    if (Show_Layout_Guides) color(guide_rgb) translate([0, 0, 0.11]) linear_extrude(0.005)
        rim(0.08) circle(r=Base_Width/(2*sin(9)), $fn=360);
}

// Printability. A stroke thinner than one printed line disappears under an
// opening (shrink by half a line, then grow back). A gap narrower than one line
// fills under a closing (grow, then shrink back). komascad.py check measures
// the area of each as a share of the lettering. Characters only: diagrams are
// made of lines and gaps of at least one printed line.
print_line = Print_Line_Width/Model_Scale;
module letters(f) { intersection() { raw_inscription(f, diagram=false); safe_face(f); } }
module thin_strokes(f) {
    difference() { letters(f); offset(r=print_line/2) offset(r=-print_line/2) letters(f); }
}
module narrow_gaps(f) {
    difference() { offset(r=-print_line/2) offset(r=print_line/2) letters(f); letters(f); }
}
module inspect_printability() {
    preview_only();
    for (f = [true, false]) if (active(f)) translate([(f ? -0.6 : 0.6)*Base_Width, 0, 0]) {
        color(material_rgb(body_role)) linear_extrude(0.1) flat_face(f);
        color(material_rgb(face_role(f))) translate([0, 0, 0.12]) linear_extrude(0.02) inscription(f);
        color([1, 0.85, 0, 1]) translate([0, 0, 0.16]) linear_extrude(0.02) thin_strokes(f);
        color([0.1, 0.6, 1, 1]) translate([0, 0, 0.16]) linear_extrude(0.02) narrow_gaps(f);
    }
    echo(str("Inspect printability: front left, back right. Yellow: strokes thinner than Print Line Width.",
             " Blue: gaps narrower than it."));
}
// komascad.py check exports these as 2D SVG, with Output_Mode "Printability <front|back> <ink|thin|gaps>".
module printability_layer(f, layer) {
    if (active(f) && len(chars(f)) > 0) {
        if (layer == "ink") letters(f);
        if (layer == "thin") thin_strokes(f);
        if (layer == "gaps") narrow_gaps(f);
    }
}


// ===== 9. Checks ==============================================================
// Stop with a message when the settings cannot make a piece.

assert(abs(2*base_angle + 2*shoulder_angle + tip_angle - 540) < 0.001,
    "The outline angles do not close. Choose a Derive mode, or correct the angles.");
assert(base_angle > 45 && base_angle < 90 && shoulder_angle > 90 && shoulder_angle < 180
       && tip_angle > 60 && tip_angle < 180,
    "The outline angles are outside the supported range.");
if (Pawn_Circle) {
    assert(abs(base_angle - 81) < 1e-6,
        str("Pawn Circle needs a base angle of 81 degrees; it is ", base_angle, ". Set it to 81, or use Derive base."));
    assert(Piece_Length < pawn_circle_apothem,
        str("Pawn Circle: the length must be less than ", pawn_circle_apothem, " mm at this width."));
}
if (Taper_Mode == "Tip thickness")
    assert(Tip_Thickness <= Rear_Thickness, "The tip cannot be thicker than the heel.");
else
    assert(Front_Side_Base_Angle > 60 && Front_Side_Base_Angle <= 90
           && Back_Side_Base_Angle > 60 && Back_Side_Base_Angle <= 90,
        "Side angles must be more than 60 and not more than 90 degrees.");
assert(shoulder_x > 0 && shoulder_y > 0 && shoulder_y < Piece_Length,
    "These dimensions and angles do not make a convex piece.");
assert(tip_thickness > 0, "The taper makes the point vanish. Increase the thickness, or reduce the taper.");
assert(Bevel_Width < min(Base_Width, Piece_Length)/8, "Bevel Width is too large.");
for (p = safe_outline, i = [0:4])
    assert((p - outline[i])*inward(unit(outline[(i+1)%5] - outline[i])) >= safe_inset - 0.0001
           && safe_outline[1][0] > safe_outline[0][0] && safe_outline[3][1] > safe_outline[2][1],
        "Text Margin leaves no face. Reduce the margin or the bevel, or make the piece larger.");
// The solid material at the point: the tip, less both bevels and both recesses.
function recess_z(f) = recessed(f) && Output_Mode != "Blank" ? depth(f)*sqrt(1 + pow(slope(f), 2)) : 0;
assert((tip_thickness - (has_bevel ? 2*Bevel_Depth : 0) - recess_z(true) - recess_z(false))*Model_Scale >= Minimum_Web,
    "Too little solid material at the point. Increase Tip Thickness, or reduce the recess depth or the bevel.");
for (f = [true, false])
    assert(!(style(f) == "Raised" && active(f) && Print_Orientation == (f ? "Front face down" : "Back face down")),
        str(f ? "Raised front" : "Raised back", " text would go into the bed. Choose another Print Orientation."));
if (Text_Color_Treatment == "Flush filled")
    for (f = [true, false]) assert(!active(f) || style(f) == "Recessed",
        "Flush filled needs Recessed text. Choose Face only or Painted grooves for Raised text.");
assert(Move_Stroke >= Print_Line_Width && Move_Gap >= Print_Line_Width,
    "Move Stroke and Move Gap cannot be less than Print Line Width.");
if (signature_active())
    assert(Signature_Depth < Piece_Length/4 && sig_half_width > 0 && sig_high > sig_low,
        "The signature margin and depth leave no space on the heel.");

// True when point q is inside or on the convex polygon poly.
function inside_convex(q, poly) =
    let(n = len(poly), sides = [for (i = [0:n-1]) let(a = poly[i], b = poly[(i+1)%n])
            (b[0] - a[0])*(q[1] - a[1]) - (b[1] - a[1])*(q[0] - a[0])])
    min(sides) >= -1e-6 || max(sides) <= 1e-6;

// A diagram never shrinks below printable, so a face that cannot hold it and
// its characters stops here. Inspect printability checks the characters.
for (f = [true, false]) if (has_moves(f) && active(f)) {
    name = f ? "Front" : "Back";
    ys = safe_ys(f);
    need = stack_height(f);
    assert(Move_Pitch == 0 || Move_Pitch/Model_Scale >= min_pitch(f) - 1e-6,
        str(name, " Moves need at least ", min_pitch(f)*Model_Scale, " mm between squares; Move Pitch is ",
            Move_Pitch, " mm."));
    assert(center_y(f) - need/2 >= min(ys) - 0.01 && center_y(f) + need/2 <= max(ys) + 0.01,
        Move_Pitch > 0 && len(chars(f)) > 0
        ? str(name, " characters and movement diagram run off the face. Move them with ", name,
              "_Center_Fraction, or raise Model Scale.")
        : str(name, " characters and movement diagram need ", need*Model_Scale, " mm of face length; the face has ",
              (max(ys) - min(ys))*Model_Scale, " mm. Raise Model Scale, or use fewer characters."));
    // Across the face too: Protect Face Edges would cut a wide diagram without a message.
    i = diagram_slot(f);
    size = diagram_size(f);
    at = [text_x(f) + glyph_x(f, i), center_y(f) + diagram_y(f) + glyph_y(f, i)];
    corners_out = [for (dx = [-1, 1], dy = [-1, 1])
        if (!inside_convex(at + [dx*size[0]/2, dy*size[1]/2], face_polygon(safe_outline, f))) 1];
    assert(len(corners_out) == 0,
        str(name, " movement diagram is ", size[0]*Model_Scale, " mm wide and runs past the sides of the face.",
            " Raise Model Scale, lower Move Pitch, or move it with ", name, "_Center_Fraction."));
    // komascad.py and the tests read this line: the drawn pitch and size, then
    // the smallest printable ones, in final mm.
    echo("KOMASCAD_MOVES", name, pitch(f)*Model_Scale, diagram_size(f)*Model_Scale,
         min_pitch(f)*Model_Scale, min_diagram_size(f)*Model_Scale);
}

// Information in the Console.
echo(str("KomaSCAD ", version, ". Angles base / shoulder / point: ", base_angle, " / ", shoulder_angle, " / ",
         tip_angle, ". Tip thickness: ", tip_thickness*Model_Scale, " mm."));
for (f = [true, false]) if (slots(f) > 0)
    echo(str(f ? "Front" : "Back", " text size / spacing / center: ",
             font_size(f), " / ", char_spacing(f), " / ", center_y(f), " mm"));
if (Pawn_Circle)
    echo(str("Pawn Circle: outer diameter ", Base_Width/sin(9)*Model_Scale, " mm, inner diameter ",
             2*(pawn_circle_apothem - Piece_Length)*Model_Scale, " mm."));
// komascad.py reads these lines to name the materials and check the fonts.
if (Export_Metadata) {
    echo("KOMASCAD_FONTS", concat([for (f = [true, false]) if (active(f)) font(f)],
                                  signature_active() ? [signature_font()] : []));
    echo("KOMASCAD_EXPORT", [for (role = [0:3])
        [role_names[role], material_name(role), material_rgb(role), role == body_role || role_active(role)]]);
}


// ===== 10. Output =============================================================

module on_bed() {
    if (Print_Orientation == "Upright") translate([0, Rear_Thickness, 0]) rotate([90, 0, 0]) children();
    // Turn the piece over, make the front face level, and lift it onto the bed.
    else if (Print_Orientation == "Front face down")
        translate([0, 0, Rear_Thickness*cos(atan(front_slope))]) rotate([-atan(front_slope), 0, 0])
            rotate([0, 180, 0]) children();
    else if (Print_Orientation == "Back face down") rotate([-atan(back_slope), 0, 0]) children();
    else children();
}

printability_modes = [for (f = ["front", "back"], layer = ["ink", "thin", "gaps"]) str("Printability ", f, " ", layer)];
color_modes = ["Color body", "Color front", "Color back", "Color signature"];

if (!Export_Metadata) scale(Model_Scale) {
    if (Output_Mode == "Inspect front" || Output_Mode == "Inspect back") inspect_face(Output_Mode == "Inspect front");
    else if (Output_Mode == "Inspect printability") inspect_printability();
    else if (Output_Mode == "Inspect signature") inspect_signature();
    else if (Output_Mode == "Inspect pawn circle") inspect_pawn_circle();
    else if (in_list(Output_Mode, printability_modes)) {
        k = search([Output_Mode], printability_modes)[0];
        printability_layer(k < 3, ["ink", "thin", "gaps"][k%3]);
    }
    else on_bed() {
        if (Output_Mode == "Blank") color(material_rgb(body_role)) blank();
        else if (in_list(Output_Mode, color_modes)) {
            role = search([Output_Mode], color_modes)[0];   // the modes are in role order
            color(material_rgb(role)) render(convexity=30) if (role == body_role) body_part(); else color_part(role);
        }
        else if ($preview) print_preview();
        else color(material_rgb(body_role)) piece();
    }
}
